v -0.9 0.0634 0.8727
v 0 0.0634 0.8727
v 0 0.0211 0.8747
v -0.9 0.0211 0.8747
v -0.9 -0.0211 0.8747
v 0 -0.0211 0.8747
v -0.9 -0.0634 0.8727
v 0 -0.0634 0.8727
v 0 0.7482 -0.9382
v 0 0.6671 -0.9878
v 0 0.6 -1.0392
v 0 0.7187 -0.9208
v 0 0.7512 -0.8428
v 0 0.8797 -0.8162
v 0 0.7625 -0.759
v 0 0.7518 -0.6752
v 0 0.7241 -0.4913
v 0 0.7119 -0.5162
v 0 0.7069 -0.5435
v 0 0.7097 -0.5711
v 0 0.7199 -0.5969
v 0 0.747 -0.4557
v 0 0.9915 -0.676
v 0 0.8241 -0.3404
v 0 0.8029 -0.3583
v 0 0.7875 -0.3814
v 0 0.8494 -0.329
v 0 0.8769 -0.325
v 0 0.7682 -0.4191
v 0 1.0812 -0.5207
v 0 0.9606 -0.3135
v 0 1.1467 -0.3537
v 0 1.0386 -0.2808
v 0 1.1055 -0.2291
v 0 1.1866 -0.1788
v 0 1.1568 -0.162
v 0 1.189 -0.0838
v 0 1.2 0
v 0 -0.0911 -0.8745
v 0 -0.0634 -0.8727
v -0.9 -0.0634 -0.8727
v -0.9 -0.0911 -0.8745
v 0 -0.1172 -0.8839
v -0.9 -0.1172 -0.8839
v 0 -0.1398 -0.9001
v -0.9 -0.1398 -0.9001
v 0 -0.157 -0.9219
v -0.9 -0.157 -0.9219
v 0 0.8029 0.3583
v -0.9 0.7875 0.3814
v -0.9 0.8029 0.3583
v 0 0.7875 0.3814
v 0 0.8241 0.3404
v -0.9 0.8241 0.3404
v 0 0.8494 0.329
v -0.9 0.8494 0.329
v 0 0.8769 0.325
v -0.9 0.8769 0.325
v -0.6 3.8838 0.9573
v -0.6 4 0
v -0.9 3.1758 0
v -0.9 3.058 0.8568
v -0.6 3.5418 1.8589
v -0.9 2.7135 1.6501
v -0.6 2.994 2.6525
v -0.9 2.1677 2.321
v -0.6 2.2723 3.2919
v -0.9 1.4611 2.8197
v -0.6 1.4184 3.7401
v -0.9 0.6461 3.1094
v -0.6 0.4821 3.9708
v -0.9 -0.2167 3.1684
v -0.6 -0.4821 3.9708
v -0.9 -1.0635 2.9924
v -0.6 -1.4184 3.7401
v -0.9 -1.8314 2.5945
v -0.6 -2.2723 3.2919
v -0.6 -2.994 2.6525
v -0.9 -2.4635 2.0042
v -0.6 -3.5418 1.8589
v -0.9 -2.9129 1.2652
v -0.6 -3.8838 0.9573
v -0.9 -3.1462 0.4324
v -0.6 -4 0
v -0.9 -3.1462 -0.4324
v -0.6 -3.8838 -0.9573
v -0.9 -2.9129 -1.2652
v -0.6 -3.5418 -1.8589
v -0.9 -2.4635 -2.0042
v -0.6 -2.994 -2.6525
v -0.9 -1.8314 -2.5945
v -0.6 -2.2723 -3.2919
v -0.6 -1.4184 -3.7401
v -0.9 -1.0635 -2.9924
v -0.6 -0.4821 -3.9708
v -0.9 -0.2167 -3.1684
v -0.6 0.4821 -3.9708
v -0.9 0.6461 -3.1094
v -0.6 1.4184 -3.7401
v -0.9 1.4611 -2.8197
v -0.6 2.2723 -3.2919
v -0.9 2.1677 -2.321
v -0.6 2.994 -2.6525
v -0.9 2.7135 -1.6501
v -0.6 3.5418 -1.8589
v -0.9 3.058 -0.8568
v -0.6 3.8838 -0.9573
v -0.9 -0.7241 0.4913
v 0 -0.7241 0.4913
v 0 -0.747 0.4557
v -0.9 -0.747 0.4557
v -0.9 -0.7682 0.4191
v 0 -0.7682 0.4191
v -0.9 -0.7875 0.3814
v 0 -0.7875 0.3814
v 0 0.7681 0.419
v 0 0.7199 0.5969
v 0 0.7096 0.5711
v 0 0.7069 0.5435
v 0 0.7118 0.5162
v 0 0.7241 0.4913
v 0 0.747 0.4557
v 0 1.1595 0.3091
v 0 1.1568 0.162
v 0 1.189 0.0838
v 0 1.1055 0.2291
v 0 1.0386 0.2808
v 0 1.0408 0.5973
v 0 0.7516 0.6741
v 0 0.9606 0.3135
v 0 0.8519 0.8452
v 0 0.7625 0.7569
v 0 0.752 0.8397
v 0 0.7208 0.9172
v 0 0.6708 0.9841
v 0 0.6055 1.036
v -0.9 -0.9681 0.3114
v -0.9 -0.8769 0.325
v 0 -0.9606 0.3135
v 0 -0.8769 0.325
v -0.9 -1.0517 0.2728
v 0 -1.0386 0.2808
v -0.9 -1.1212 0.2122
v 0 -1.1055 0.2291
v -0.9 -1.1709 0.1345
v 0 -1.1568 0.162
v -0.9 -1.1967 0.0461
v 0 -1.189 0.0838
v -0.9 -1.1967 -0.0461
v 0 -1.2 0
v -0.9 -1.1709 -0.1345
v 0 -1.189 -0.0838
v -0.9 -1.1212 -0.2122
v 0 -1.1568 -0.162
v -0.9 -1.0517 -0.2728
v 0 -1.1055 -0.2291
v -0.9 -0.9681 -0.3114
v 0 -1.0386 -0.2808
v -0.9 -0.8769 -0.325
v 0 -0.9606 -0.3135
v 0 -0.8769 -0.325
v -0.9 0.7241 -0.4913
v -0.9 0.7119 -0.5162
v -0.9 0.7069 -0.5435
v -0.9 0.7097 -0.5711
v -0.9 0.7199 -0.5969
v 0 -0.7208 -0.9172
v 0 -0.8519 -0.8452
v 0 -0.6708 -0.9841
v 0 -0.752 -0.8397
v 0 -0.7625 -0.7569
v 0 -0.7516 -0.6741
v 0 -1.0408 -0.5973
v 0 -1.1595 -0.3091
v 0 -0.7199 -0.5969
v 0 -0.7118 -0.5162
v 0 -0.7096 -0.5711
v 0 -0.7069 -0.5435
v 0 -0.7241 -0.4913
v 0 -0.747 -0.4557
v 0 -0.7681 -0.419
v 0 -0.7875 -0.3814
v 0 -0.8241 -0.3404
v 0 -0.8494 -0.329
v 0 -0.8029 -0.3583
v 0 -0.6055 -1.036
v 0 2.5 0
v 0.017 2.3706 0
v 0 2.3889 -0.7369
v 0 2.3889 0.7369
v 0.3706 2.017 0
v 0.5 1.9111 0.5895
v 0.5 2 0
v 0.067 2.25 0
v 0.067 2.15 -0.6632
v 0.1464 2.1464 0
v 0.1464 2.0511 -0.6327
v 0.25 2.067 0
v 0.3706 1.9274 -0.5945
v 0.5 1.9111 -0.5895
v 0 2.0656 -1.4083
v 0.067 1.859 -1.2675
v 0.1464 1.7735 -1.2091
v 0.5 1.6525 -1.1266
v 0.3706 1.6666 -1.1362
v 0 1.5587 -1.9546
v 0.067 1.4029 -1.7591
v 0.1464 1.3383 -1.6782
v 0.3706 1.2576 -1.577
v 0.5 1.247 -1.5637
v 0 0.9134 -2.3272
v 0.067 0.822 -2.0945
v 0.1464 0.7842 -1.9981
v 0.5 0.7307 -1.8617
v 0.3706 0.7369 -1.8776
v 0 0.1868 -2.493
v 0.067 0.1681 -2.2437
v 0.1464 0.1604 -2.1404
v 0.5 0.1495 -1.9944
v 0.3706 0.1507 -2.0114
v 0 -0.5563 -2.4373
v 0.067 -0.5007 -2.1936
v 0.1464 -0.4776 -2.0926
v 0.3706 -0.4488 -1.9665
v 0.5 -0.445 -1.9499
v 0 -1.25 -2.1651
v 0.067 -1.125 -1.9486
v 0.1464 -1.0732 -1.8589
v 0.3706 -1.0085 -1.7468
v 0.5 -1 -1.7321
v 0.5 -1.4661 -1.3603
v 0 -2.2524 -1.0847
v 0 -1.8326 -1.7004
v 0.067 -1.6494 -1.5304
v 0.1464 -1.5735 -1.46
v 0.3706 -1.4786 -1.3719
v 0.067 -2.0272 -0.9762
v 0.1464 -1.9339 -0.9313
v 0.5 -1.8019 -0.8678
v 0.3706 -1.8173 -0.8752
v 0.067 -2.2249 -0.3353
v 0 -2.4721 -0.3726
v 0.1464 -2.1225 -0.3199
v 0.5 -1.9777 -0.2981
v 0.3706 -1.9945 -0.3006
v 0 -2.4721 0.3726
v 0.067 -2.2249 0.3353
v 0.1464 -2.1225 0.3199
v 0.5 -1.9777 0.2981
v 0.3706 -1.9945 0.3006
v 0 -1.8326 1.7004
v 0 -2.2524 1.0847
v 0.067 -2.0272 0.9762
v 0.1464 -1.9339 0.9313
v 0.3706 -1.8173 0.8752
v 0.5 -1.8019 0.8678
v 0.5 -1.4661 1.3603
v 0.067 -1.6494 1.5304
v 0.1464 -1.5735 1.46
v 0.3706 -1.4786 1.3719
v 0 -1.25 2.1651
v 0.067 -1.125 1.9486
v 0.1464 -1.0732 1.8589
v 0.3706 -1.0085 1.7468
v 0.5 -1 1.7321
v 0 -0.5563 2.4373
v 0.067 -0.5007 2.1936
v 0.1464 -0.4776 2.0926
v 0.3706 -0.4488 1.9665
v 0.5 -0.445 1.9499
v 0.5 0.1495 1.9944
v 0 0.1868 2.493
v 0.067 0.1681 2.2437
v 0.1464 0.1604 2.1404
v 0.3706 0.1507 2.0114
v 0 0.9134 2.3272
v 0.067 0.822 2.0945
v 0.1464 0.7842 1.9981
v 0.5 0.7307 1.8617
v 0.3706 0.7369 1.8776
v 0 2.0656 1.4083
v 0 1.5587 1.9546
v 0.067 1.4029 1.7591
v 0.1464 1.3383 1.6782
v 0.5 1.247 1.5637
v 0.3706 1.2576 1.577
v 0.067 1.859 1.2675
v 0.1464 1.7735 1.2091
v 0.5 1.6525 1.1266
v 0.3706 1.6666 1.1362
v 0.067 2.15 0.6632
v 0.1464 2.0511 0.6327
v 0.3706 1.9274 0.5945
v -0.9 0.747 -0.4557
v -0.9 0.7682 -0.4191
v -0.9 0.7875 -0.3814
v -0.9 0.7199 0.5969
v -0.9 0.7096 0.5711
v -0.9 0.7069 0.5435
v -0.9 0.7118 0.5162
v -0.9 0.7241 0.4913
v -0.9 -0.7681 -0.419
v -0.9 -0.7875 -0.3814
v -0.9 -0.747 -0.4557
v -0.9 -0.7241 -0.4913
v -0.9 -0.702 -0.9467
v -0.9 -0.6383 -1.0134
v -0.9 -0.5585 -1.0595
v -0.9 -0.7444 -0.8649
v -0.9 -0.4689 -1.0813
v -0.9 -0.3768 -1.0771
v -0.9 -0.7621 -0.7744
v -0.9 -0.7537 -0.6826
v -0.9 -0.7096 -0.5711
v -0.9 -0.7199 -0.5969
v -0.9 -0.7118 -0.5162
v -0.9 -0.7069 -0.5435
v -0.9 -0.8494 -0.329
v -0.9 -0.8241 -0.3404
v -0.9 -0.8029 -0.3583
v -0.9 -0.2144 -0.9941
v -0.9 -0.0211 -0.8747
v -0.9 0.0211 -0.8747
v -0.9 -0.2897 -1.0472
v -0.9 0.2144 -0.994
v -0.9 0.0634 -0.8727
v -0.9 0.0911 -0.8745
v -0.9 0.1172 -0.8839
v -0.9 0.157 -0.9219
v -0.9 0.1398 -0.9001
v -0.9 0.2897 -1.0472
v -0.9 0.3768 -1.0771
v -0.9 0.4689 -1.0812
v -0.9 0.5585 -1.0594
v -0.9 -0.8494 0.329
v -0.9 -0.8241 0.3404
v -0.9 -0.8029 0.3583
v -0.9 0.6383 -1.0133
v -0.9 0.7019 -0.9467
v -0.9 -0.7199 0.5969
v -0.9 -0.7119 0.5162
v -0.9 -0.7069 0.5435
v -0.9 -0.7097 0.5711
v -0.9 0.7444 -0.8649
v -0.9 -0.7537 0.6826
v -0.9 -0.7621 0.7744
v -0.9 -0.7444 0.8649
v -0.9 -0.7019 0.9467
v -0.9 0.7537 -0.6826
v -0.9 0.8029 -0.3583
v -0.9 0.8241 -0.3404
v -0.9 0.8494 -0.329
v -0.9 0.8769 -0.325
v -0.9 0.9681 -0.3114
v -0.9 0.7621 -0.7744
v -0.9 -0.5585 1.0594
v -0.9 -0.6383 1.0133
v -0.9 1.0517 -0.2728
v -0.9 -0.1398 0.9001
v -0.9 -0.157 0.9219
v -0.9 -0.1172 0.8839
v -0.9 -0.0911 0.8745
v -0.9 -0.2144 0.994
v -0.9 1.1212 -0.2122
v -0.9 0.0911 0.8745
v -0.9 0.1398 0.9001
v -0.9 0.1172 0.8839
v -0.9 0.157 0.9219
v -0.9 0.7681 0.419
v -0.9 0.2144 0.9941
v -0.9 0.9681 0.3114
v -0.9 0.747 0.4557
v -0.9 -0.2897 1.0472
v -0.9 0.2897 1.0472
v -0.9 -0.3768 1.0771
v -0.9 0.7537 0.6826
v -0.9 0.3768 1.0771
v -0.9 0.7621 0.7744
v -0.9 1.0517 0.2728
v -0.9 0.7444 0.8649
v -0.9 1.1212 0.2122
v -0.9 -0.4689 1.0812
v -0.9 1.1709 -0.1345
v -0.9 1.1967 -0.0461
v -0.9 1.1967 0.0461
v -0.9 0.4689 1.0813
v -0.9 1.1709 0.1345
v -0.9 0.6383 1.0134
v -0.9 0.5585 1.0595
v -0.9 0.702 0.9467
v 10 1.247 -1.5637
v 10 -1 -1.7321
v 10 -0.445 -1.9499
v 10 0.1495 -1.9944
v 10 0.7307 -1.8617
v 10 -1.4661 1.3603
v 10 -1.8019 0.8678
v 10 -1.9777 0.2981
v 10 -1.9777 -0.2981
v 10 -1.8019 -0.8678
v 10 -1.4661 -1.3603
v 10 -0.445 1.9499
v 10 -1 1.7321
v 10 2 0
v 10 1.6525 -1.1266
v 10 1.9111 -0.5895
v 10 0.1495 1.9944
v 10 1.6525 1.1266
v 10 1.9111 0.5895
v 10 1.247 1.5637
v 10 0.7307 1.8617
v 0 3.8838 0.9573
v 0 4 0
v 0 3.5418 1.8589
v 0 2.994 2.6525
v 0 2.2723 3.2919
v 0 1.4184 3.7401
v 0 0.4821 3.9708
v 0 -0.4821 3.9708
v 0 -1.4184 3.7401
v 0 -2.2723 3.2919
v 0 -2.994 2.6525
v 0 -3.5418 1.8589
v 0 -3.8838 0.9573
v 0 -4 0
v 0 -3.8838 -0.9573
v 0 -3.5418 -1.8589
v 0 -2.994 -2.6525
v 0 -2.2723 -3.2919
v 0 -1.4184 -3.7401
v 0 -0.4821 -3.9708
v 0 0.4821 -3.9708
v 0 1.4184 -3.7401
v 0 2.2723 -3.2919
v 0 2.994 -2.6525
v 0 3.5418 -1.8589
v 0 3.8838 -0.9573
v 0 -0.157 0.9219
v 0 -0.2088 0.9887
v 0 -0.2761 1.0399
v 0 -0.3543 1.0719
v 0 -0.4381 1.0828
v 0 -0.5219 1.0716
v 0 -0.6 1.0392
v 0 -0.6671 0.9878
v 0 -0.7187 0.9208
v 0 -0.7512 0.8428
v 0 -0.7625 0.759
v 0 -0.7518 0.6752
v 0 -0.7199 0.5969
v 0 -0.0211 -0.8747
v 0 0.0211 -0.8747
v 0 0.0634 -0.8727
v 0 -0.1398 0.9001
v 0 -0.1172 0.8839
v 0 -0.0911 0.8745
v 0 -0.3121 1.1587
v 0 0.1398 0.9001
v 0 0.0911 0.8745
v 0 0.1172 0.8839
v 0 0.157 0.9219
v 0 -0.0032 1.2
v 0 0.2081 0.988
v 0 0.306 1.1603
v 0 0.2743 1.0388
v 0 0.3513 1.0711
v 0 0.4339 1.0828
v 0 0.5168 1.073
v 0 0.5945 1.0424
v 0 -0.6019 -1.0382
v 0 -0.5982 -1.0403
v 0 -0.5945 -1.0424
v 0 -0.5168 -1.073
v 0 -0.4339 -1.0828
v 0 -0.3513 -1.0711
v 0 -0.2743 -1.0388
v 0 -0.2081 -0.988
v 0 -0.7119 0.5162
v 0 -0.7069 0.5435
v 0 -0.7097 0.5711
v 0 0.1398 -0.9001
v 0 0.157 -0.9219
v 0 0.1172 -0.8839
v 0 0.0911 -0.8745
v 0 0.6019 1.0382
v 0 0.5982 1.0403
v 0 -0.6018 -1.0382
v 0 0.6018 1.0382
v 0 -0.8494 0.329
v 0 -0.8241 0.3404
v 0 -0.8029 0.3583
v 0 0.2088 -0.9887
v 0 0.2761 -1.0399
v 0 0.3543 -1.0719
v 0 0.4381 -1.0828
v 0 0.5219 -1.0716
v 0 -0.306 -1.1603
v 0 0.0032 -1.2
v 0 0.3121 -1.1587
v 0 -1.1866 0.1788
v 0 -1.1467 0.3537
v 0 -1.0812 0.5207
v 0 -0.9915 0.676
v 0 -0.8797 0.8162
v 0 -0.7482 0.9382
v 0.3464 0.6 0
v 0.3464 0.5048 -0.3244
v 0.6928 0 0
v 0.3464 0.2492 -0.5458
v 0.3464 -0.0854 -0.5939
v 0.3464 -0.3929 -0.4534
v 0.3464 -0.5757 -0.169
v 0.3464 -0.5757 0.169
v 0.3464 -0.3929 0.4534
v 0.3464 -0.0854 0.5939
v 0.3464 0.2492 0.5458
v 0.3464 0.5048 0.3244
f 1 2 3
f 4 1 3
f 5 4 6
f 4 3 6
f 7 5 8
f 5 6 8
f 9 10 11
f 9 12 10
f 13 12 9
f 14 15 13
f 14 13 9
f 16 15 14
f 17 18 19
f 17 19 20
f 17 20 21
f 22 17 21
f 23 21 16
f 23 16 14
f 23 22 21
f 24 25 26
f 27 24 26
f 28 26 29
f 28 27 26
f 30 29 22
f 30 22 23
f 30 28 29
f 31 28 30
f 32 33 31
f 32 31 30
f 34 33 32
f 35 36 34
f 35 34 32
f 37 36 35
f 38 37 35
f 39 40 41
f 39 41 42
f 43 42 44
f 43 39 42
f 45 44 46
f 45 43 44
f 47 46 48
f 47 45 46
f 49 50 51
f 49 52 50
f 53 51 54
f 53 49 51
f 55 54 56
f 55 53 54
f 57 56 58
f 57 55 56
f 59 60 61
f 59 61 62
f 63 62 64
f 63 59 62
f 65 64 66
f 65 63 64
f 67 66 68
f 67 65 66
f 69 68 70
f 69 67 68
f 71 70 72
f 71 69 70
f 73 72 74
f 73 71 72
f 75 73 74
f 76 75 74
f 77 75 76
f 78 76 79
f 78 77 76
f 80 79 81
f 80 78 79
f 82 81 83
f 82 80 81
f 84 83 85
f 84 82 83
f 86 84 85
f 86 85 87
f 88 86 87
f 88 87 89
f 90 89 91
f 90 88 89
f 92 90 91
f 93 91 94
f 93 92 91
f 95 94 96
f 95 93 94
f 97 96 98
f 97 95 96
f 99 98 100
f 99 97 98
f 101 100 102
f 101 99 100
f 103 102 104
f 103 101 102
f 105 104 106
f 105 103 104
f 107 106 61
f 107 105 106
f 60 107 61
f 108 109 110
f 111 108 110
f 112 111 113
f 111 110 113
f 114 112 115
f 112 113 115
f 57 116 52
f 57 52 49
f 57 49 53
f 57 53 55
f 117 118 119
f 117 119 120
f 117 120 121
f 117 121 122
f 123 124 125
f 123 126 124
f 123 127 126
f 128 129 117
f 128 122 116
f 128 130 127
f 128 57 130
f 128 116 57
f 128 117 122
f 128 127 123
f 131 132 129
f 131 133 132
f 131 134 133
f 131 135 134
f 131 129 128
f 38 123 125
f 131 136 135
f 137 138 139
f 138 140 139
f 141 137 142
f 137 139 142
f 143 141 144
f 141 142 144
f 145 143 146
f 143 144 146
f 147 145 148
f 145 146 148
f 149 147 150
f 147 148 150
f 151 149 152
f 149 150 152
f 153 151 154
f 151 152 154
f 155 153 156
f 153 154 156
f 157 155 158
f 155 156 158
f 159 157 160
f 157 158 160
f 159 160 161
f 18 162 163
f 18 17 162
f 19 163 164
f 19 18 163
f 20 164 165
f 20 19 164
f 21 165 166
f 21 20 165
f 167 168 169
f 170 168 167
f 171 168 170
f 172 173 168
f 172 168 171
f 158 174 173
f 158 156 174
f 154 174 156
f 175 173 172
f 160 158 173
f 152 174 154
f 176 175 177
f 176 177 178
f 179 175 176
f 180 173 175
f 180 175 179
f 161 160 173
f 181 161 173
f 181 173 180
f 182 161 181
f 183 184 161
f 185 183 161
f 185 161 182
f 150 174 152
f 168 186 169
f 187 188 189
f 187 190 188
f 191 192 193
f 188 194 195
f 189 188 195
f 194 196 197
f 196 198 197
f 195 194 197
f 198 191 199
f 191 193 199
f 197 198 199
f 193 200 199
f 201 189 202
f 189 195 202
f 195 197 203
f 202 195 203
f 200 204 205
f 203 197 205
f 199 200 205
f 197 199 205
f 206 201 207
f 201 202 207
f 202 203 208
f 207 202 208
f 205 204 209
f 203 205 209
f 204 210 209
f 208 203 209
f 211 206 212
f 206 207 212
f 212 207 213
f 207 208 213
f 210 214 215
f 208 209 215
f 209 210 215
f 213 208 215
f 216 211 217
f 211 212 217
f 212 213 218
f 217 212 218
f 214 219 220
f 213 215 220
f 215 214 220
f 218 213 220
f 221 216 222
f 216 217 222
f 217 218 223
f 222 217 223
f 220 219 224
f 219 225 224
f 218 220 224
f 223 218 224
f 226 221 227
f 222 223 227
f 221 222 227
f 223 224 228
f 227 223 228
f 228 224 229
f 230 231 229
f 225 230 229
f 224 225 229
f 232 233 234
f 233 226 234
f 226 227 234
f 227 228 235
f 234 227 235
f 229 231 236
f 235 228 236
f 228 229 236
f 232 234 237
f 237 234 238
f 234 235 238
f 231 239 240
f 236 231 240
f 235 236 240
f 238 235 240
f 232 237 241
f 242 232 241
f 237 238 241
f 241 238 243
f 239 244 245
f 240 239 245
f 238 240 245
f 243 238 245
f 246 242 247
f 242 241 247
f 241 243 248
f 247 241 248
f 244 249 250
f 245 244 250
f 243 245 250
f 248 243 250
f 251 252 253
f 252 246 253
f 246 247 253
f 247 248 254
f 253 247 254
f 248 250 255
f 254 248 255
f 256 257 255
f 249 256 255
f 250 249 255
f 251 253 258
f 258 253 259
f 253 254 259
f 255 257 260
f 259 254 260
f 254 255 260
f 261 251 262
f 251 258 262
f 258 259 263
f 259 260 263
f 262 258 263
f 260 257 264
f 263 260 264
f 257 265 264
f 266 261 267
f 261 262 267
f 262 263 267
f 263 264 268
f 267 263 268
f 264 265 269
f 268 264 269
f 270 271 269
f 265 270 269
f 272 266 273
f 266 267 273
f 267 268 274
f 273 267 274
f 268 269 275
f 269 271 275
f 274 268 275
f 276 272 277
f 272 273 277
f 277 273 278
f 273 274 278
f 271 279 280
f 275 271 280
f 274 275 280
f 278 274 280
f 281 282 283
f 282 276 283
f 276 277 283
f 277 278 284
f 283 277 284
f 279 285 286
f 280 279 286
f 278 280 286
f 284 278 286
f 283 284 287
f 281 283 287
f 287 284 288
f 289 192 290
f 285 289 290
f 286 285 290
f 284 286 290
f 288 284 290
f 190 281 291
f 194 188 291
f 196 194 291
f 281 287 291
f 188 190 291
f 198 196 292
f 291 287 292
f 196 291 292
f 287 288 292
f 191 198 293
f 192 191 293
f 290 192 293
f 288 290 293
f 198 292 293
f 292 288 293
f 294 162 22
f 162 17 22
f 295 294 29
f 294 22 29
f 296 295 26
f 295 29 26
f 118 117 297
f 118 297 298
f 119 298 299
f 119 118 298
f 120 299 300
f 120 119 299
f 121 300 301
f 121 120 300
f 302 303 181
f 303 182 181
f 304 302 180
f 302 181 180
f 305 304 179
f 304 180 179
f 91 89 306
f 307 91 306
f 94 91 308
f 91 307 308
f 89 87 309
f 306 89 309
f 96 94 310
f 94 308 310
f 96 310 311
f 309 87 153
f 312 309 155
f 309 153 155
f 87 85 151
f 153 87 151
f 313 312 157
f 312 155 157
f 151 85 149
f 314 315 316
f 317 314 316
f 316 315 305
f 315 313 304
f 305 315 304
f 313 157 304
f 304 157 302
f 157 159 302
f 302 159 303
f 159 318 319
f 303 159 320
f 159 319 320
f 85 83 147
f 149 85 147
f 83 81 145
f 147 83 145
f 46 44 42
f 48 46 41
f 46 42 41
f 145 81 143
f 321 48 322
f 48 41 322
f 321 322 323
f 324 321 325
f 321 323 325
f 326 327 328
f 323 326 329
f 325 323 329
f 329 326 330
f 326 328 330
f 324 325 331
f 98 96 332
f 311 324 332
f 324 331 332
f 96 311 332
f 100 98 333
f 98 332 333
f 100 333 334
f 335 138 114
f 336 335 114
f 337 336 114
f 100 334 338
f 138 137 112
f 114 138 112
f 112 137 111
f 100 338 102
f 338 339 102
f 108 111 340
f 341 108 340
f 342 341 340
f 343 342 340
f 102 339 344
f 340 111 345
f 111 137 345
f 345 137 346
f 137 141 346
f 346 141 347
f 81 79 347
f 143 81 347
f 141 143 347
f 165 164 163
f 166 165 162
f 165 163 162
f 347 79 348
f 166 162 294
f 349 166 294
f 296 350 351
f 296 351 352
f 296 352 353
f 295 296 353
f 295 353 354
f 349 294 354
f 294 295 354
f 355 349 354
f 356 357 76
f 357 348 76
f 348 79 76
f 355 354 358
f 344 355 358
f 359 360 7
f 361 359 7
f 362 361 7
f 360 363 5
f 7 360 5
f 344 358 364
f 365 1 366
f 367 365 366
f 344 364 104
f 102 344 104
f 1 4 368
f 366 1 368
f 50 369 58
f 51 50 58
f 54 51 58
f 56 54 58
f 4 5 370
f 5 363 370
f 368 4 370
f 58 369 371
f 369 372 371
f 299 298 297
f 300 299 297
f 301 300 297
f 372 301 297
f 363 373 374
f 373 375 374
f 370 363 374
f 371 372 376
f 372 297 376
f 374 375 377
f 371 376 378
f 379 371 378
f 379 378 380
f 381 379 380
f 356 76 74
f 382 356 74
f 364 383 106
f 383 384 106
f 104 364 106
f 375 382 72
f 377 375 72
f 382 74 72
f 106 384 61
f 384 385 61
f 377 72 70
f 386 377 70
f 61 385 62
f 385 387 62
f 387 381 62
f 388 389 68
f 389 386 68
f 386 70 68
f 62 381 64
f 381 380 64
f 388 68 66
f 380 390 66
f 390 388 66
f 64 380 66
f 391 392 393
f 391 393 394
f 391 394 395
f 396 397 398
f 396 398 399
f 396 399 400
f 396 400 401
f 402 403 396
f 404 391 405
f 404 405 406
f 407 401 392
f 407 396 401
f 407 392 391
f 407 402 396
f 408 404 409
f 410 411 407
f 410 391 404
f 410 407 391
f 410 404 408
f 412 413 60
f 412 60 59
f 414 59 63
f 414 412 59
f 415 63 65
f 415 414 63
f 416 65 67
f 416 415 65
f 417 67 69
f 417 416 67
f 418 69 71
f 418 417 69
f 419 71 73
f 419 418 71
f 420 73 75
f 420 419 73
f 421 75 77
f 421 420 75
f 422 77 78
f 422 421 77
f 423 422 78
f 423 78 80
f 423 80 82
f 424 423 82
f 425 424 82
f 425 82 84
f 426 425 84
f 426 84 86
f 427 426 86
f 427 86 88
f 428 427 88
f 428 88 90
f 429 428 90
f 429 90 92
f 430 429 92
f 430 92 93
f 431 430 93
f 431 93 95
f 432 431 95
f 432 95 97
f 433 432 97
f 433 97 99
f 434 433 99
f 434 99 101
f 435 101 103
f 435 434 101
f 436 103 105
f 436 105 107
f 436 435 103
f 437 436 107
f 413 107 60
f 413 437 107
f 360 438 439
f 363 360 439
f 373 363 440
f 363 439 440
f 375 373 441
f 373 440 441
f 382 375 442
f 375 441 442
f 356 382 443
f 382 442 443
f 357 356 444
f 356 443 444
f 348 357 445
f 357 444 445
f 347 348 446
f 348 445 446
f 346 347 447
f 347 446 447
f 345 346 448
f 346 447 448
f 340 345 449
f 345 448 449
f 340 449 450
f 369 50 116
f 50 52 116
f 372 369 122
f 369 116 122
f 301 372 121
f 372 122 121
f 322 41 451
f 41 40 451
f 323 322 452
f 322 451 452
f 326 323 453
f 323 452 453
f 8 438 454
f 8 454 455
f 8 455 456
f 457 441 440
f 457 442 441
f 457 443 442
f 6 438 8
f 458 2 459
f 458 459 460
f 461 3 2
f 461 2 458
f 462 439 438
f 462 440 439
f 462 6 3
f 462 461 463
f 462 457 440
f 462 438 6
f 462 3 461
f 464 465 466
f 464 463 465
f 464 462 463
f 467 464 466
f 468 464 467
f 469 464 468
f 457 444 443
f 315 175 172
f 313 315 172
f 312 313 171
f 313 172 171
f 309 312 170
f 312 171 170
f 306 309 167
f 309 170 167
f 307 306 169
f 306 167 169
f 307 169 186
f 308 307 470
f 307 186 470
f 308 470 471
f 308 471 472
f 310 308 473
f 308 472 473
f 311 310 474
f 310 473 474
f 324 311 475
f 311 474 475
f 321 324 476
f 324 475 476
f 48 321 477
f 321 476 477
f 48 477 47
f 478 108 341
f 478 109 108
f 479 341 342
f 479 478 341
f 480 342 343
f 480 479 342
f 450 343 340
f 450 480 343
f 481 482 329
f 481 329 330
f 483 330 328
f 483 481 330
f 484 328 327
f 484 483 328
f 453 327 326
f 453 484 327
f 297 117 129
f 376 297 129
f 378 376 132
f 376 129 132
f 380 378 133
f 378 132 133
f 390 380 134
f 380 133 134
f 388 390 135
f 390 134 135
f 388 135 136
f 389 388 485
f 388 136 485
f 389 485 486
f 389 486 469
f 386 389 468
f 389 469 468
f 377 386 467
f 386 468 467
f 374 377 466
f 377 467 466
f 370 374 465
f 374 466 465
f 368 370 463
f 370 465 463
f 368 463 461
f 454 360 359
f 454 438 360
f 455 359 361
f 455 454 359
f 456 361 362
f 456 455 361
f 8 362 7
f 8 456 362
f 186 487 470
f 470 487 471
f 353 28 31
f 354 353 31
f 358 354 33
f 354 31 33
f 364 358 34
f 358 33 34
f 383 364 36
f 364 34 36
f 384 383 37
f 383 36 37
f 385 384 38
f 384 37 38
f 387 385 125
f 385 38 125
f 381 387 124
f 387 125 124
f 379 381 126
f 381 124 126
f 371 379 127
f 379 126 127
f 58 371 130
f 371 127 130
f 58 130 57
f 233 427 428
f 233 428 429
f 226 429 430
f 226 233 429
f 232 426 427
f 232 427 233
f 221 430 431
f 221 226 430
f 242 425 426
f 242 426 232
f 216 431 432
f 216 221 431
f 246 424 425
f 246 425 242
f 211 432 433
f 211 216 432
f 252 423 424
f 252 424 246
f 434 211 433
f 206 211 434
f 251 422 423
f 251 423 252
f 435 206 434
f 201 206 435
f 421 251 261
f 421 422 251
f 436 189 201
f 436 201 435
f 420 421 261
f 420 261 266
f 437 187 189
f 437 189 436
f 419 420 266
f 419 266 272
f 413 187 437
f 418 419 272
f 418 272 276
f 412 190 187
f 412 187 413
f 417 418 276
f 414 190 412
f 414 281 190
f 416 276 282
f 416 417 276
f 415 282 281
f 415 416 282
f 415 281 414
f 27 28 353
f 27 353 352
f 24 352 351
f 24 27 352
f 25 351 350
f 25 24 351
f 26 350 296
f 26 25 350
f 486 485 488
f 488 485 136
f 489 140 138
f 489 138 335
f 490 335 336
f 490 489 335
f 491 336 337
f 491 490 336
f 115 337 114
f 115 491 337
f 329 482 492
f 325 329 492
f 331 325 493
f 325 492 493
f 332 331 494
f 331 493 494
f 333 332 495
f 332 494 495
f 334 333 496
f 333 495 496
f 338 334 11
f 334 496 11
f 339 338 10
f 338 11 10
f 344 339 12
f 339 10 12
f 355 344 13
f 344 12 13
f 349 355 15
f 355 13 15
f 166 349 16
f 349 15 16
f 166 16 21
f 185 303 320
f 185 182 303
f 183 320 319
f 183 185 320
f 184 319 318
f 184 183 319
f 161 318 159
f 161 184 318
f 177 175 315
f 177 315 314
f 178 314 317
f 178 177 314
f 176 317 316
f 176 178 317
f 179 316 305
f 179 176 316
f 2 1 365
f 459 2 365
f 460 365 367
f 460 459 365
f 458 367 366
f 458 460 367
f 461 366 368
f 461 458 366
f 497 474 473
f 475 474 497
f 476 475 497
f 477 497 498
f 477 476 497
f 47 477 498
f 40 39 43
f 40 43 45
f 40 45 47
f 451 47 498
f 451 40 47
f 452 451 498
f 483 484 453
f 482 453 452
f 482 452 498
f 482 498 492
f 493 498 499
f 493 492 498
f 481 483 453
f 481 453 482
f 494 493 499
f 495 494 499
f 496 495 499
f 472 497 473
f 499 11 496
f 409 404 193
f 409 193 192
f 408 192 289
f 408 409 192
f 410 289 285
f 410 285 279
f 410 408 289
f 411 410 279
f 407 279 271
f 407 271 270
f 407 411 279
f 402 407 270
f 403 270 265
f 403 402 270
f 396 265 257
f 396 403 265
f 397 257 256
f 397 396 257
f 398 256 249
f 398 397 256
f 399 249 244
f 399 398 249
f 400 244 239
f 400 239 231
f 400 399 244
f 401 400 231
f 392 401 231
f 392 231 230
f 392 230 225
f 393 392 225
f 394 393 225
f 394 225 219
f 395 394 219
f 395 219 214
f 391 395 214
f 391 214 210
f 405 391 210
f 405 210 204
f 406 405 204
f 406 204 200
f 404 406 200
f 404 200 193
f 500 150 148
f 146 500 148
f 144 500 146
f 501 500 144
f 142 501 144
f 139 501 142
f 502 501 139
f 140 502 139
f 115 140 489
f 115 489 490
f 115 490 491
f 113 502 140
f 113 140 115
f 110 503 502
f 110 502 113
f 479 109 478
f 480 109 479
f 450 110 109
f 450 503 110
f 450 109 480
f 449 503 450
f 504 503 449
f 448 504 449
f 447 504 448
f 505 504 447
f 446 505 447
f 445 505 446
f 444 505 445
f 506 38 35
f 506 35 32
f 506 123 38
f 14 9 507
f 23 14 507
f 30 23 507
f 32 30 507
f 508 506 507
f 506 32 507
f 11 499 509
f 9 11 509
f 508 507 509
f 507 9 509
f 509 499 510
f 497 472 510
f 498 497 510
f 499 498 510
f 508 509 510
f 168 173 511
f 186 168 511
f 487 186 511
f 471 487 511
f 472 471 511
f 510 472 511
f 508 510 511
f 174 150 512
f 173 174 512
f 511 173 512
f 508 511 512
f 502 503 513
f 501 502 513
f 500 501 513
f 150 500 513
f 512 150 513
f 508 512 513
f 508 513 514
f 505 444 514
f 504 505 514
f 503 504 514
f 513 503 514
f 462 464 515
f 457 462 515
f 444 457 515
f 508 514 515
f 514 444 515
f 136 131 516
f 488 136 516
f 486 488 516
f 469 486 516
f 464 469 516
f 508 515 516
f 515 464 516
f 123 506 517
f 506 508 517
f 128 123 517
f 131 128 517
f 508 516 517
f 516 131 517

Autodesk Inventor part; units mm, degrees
ref_plane "YZ Plane" through (0, 0, 0) normal (1, 0, 0) x (0, 1, 0)
ref_plane "XZ Plane" through (0, 0, 0) normal (0, 1, 0) x (-1, 0, 0)
ref_plane "XY Plane" through (0, 0, 0) normal (0, 0, 1) x (1, 0, 0)
sketch "Sketch_1" plane through (0, 0, 0) normal (0, 0, 1) x (1, 0, 0)
  line L0 (10, 0) -> (-0.9, 0)
  line L1 (-0.9, 0) -> (-0.9, 3.1758)
  line L2 (-0.9, 3.1758) -> (-0.6, 4)
  line L3 (-0.6, 4) -> (0, 4)
  line L4 (0, 4) -> (0, 2.5)
  arc A0 (0, 2.5) -> (0.5, 2) centre (0.5, 2.5) ccw
  line L5 (0.5, 2) -> (10, 2)
  line L6 (10, 2) -> (10, 0)
  line L7 (10, 0) -> (-0.9, 0)
revolve "Revolution1" add sketch "Sketch_1" angle 360 about axis through (10, 0, 0) along (1, 0, 0)
thread "Thread1" size "M4x0.7" class "6g" standard "ISO Metric profile" length 9.3 offset 0.2
sketch "Sketch_5" plane through (0, 0, 0) normal (1, 0, 0) x (0, 0, -1)
  arc A0 (-0.9219, -0.157) -> (-0.5969, -0.7199) centre (-0.7578, -0.4375) ccw
  arc A1 (-0.4913, -0.7241) -> (-0.5969, -0.7199) centre (-0.5474, -0.8068) ccw
  arc A2 (-0.4913, -0.7241) -> (-0.3814, -0.7875) centre (0, 0) ccw
  arc A3 (-0.325, -0.8769) -> (-0.3814, -0.7875) centre (-0.425, -0.8775) ccw
  arc A4 (-0.325, -0.8769) -> (0.325, -0.8769) centre (0, -0.875) ccw
  arc A5 (0.3814, -0.7875) -> (0.325, -0.8769) centre (0.425, -0.8775) ccw
  arc A6 (0.3814, -0.7875) -> (0.4913, -0.7241) centre (0, 0) ccw
  arc A7 (0.5969, -0.7199) -> (0.4913, -0.7241) centre (0.5474, -0.8068) ccw
  arc A8 (0.5969, -0.7199) -> (0.9219, -0.157) centre (0.7578, -0.4375) ccw
  arc A9 (0.8727, -0.0634) -> (0.9219, -0.157) centre (0.9724, -0.0707) ccw
  arc A10 (0.8727, -0.0634) -> (0.8727, 0.0634) centre (0, 0) ccw
  arc A11 (0.9219, 0.157) -> (0.8727, 0.0634) centre (0.9724, 0.0707) ccw
  arc A12 (0.9219, 0.157) -> (0.5969, 0.7199) centre (0.7578, 0.4375) ccw
  arc A13 (0.4913, 0.7241) -> (0.5969, 0.7199) centre (0.5474, 0.8068) ccw
  arc A14 (0.4913, 0.7241) -> (0.3814, 0.7875) centre (0, 0) ccw
  arc A15 (0.325, 0.8769) -> (0.3814, 0.7875) centre (0.425, 0.8775) ccw
  arc A16 (0.325, 0.8769) -> (-0.325, 0.8769) centre (0, 0.875) ccw
  arc A17 (-0.3814, 0.7875) -> (-0.325, 0.8769) centre (-0.425, 0.8775) ccw
  arc A18 (-0.3814, 0.7875) -> (-0.4913, 0.7241) centre (0, 0) ccw
  arc A19 (-0.5969, 0.7199) -> (-0.4913, 0.7241) centre (-0.5474, 0.8068) ccw
  arc A20 (-0.5969, 0.7199) -> (-0.9219, 0.157) centre (-0.7578, 0.4375) ccw
  arc A21 (-0.8727, 0.0634) -> (-0.9219, 0.157) centre (-0.9724, 0.0707) ccw
  arc A22 (-0.8727, 0.0634) -> (-0.8727, -0.0634) centre (0, 0) ccw
  arc A23 (-0.9219, -0.157) -> (-0.8727, -0.0634) centre (-0.9724, -0.0707) ccw
extrude "Extrusion1" cut sketch "Sketch_5" against normal blind 0.9
sketch "Sketch_2" plane through (0, 0, 0) normal (0, 0, 1) x (1, 0, 0)
  line L0 (0.6928, 0) -> (0, 0)
  line L1 (0, 0) -> (0, 1.2)
  line L2 (0, 1.2) -> (0.6928, 0)
  line L3 (0.6928, 0) -> (0, 0)
revolve "Revolution2" cut sketch "Sketch_2" angle 360 about axis through (0.6928, 0, 0) along (1, 0, 0)
properties part number "CBSTSE4-10"
